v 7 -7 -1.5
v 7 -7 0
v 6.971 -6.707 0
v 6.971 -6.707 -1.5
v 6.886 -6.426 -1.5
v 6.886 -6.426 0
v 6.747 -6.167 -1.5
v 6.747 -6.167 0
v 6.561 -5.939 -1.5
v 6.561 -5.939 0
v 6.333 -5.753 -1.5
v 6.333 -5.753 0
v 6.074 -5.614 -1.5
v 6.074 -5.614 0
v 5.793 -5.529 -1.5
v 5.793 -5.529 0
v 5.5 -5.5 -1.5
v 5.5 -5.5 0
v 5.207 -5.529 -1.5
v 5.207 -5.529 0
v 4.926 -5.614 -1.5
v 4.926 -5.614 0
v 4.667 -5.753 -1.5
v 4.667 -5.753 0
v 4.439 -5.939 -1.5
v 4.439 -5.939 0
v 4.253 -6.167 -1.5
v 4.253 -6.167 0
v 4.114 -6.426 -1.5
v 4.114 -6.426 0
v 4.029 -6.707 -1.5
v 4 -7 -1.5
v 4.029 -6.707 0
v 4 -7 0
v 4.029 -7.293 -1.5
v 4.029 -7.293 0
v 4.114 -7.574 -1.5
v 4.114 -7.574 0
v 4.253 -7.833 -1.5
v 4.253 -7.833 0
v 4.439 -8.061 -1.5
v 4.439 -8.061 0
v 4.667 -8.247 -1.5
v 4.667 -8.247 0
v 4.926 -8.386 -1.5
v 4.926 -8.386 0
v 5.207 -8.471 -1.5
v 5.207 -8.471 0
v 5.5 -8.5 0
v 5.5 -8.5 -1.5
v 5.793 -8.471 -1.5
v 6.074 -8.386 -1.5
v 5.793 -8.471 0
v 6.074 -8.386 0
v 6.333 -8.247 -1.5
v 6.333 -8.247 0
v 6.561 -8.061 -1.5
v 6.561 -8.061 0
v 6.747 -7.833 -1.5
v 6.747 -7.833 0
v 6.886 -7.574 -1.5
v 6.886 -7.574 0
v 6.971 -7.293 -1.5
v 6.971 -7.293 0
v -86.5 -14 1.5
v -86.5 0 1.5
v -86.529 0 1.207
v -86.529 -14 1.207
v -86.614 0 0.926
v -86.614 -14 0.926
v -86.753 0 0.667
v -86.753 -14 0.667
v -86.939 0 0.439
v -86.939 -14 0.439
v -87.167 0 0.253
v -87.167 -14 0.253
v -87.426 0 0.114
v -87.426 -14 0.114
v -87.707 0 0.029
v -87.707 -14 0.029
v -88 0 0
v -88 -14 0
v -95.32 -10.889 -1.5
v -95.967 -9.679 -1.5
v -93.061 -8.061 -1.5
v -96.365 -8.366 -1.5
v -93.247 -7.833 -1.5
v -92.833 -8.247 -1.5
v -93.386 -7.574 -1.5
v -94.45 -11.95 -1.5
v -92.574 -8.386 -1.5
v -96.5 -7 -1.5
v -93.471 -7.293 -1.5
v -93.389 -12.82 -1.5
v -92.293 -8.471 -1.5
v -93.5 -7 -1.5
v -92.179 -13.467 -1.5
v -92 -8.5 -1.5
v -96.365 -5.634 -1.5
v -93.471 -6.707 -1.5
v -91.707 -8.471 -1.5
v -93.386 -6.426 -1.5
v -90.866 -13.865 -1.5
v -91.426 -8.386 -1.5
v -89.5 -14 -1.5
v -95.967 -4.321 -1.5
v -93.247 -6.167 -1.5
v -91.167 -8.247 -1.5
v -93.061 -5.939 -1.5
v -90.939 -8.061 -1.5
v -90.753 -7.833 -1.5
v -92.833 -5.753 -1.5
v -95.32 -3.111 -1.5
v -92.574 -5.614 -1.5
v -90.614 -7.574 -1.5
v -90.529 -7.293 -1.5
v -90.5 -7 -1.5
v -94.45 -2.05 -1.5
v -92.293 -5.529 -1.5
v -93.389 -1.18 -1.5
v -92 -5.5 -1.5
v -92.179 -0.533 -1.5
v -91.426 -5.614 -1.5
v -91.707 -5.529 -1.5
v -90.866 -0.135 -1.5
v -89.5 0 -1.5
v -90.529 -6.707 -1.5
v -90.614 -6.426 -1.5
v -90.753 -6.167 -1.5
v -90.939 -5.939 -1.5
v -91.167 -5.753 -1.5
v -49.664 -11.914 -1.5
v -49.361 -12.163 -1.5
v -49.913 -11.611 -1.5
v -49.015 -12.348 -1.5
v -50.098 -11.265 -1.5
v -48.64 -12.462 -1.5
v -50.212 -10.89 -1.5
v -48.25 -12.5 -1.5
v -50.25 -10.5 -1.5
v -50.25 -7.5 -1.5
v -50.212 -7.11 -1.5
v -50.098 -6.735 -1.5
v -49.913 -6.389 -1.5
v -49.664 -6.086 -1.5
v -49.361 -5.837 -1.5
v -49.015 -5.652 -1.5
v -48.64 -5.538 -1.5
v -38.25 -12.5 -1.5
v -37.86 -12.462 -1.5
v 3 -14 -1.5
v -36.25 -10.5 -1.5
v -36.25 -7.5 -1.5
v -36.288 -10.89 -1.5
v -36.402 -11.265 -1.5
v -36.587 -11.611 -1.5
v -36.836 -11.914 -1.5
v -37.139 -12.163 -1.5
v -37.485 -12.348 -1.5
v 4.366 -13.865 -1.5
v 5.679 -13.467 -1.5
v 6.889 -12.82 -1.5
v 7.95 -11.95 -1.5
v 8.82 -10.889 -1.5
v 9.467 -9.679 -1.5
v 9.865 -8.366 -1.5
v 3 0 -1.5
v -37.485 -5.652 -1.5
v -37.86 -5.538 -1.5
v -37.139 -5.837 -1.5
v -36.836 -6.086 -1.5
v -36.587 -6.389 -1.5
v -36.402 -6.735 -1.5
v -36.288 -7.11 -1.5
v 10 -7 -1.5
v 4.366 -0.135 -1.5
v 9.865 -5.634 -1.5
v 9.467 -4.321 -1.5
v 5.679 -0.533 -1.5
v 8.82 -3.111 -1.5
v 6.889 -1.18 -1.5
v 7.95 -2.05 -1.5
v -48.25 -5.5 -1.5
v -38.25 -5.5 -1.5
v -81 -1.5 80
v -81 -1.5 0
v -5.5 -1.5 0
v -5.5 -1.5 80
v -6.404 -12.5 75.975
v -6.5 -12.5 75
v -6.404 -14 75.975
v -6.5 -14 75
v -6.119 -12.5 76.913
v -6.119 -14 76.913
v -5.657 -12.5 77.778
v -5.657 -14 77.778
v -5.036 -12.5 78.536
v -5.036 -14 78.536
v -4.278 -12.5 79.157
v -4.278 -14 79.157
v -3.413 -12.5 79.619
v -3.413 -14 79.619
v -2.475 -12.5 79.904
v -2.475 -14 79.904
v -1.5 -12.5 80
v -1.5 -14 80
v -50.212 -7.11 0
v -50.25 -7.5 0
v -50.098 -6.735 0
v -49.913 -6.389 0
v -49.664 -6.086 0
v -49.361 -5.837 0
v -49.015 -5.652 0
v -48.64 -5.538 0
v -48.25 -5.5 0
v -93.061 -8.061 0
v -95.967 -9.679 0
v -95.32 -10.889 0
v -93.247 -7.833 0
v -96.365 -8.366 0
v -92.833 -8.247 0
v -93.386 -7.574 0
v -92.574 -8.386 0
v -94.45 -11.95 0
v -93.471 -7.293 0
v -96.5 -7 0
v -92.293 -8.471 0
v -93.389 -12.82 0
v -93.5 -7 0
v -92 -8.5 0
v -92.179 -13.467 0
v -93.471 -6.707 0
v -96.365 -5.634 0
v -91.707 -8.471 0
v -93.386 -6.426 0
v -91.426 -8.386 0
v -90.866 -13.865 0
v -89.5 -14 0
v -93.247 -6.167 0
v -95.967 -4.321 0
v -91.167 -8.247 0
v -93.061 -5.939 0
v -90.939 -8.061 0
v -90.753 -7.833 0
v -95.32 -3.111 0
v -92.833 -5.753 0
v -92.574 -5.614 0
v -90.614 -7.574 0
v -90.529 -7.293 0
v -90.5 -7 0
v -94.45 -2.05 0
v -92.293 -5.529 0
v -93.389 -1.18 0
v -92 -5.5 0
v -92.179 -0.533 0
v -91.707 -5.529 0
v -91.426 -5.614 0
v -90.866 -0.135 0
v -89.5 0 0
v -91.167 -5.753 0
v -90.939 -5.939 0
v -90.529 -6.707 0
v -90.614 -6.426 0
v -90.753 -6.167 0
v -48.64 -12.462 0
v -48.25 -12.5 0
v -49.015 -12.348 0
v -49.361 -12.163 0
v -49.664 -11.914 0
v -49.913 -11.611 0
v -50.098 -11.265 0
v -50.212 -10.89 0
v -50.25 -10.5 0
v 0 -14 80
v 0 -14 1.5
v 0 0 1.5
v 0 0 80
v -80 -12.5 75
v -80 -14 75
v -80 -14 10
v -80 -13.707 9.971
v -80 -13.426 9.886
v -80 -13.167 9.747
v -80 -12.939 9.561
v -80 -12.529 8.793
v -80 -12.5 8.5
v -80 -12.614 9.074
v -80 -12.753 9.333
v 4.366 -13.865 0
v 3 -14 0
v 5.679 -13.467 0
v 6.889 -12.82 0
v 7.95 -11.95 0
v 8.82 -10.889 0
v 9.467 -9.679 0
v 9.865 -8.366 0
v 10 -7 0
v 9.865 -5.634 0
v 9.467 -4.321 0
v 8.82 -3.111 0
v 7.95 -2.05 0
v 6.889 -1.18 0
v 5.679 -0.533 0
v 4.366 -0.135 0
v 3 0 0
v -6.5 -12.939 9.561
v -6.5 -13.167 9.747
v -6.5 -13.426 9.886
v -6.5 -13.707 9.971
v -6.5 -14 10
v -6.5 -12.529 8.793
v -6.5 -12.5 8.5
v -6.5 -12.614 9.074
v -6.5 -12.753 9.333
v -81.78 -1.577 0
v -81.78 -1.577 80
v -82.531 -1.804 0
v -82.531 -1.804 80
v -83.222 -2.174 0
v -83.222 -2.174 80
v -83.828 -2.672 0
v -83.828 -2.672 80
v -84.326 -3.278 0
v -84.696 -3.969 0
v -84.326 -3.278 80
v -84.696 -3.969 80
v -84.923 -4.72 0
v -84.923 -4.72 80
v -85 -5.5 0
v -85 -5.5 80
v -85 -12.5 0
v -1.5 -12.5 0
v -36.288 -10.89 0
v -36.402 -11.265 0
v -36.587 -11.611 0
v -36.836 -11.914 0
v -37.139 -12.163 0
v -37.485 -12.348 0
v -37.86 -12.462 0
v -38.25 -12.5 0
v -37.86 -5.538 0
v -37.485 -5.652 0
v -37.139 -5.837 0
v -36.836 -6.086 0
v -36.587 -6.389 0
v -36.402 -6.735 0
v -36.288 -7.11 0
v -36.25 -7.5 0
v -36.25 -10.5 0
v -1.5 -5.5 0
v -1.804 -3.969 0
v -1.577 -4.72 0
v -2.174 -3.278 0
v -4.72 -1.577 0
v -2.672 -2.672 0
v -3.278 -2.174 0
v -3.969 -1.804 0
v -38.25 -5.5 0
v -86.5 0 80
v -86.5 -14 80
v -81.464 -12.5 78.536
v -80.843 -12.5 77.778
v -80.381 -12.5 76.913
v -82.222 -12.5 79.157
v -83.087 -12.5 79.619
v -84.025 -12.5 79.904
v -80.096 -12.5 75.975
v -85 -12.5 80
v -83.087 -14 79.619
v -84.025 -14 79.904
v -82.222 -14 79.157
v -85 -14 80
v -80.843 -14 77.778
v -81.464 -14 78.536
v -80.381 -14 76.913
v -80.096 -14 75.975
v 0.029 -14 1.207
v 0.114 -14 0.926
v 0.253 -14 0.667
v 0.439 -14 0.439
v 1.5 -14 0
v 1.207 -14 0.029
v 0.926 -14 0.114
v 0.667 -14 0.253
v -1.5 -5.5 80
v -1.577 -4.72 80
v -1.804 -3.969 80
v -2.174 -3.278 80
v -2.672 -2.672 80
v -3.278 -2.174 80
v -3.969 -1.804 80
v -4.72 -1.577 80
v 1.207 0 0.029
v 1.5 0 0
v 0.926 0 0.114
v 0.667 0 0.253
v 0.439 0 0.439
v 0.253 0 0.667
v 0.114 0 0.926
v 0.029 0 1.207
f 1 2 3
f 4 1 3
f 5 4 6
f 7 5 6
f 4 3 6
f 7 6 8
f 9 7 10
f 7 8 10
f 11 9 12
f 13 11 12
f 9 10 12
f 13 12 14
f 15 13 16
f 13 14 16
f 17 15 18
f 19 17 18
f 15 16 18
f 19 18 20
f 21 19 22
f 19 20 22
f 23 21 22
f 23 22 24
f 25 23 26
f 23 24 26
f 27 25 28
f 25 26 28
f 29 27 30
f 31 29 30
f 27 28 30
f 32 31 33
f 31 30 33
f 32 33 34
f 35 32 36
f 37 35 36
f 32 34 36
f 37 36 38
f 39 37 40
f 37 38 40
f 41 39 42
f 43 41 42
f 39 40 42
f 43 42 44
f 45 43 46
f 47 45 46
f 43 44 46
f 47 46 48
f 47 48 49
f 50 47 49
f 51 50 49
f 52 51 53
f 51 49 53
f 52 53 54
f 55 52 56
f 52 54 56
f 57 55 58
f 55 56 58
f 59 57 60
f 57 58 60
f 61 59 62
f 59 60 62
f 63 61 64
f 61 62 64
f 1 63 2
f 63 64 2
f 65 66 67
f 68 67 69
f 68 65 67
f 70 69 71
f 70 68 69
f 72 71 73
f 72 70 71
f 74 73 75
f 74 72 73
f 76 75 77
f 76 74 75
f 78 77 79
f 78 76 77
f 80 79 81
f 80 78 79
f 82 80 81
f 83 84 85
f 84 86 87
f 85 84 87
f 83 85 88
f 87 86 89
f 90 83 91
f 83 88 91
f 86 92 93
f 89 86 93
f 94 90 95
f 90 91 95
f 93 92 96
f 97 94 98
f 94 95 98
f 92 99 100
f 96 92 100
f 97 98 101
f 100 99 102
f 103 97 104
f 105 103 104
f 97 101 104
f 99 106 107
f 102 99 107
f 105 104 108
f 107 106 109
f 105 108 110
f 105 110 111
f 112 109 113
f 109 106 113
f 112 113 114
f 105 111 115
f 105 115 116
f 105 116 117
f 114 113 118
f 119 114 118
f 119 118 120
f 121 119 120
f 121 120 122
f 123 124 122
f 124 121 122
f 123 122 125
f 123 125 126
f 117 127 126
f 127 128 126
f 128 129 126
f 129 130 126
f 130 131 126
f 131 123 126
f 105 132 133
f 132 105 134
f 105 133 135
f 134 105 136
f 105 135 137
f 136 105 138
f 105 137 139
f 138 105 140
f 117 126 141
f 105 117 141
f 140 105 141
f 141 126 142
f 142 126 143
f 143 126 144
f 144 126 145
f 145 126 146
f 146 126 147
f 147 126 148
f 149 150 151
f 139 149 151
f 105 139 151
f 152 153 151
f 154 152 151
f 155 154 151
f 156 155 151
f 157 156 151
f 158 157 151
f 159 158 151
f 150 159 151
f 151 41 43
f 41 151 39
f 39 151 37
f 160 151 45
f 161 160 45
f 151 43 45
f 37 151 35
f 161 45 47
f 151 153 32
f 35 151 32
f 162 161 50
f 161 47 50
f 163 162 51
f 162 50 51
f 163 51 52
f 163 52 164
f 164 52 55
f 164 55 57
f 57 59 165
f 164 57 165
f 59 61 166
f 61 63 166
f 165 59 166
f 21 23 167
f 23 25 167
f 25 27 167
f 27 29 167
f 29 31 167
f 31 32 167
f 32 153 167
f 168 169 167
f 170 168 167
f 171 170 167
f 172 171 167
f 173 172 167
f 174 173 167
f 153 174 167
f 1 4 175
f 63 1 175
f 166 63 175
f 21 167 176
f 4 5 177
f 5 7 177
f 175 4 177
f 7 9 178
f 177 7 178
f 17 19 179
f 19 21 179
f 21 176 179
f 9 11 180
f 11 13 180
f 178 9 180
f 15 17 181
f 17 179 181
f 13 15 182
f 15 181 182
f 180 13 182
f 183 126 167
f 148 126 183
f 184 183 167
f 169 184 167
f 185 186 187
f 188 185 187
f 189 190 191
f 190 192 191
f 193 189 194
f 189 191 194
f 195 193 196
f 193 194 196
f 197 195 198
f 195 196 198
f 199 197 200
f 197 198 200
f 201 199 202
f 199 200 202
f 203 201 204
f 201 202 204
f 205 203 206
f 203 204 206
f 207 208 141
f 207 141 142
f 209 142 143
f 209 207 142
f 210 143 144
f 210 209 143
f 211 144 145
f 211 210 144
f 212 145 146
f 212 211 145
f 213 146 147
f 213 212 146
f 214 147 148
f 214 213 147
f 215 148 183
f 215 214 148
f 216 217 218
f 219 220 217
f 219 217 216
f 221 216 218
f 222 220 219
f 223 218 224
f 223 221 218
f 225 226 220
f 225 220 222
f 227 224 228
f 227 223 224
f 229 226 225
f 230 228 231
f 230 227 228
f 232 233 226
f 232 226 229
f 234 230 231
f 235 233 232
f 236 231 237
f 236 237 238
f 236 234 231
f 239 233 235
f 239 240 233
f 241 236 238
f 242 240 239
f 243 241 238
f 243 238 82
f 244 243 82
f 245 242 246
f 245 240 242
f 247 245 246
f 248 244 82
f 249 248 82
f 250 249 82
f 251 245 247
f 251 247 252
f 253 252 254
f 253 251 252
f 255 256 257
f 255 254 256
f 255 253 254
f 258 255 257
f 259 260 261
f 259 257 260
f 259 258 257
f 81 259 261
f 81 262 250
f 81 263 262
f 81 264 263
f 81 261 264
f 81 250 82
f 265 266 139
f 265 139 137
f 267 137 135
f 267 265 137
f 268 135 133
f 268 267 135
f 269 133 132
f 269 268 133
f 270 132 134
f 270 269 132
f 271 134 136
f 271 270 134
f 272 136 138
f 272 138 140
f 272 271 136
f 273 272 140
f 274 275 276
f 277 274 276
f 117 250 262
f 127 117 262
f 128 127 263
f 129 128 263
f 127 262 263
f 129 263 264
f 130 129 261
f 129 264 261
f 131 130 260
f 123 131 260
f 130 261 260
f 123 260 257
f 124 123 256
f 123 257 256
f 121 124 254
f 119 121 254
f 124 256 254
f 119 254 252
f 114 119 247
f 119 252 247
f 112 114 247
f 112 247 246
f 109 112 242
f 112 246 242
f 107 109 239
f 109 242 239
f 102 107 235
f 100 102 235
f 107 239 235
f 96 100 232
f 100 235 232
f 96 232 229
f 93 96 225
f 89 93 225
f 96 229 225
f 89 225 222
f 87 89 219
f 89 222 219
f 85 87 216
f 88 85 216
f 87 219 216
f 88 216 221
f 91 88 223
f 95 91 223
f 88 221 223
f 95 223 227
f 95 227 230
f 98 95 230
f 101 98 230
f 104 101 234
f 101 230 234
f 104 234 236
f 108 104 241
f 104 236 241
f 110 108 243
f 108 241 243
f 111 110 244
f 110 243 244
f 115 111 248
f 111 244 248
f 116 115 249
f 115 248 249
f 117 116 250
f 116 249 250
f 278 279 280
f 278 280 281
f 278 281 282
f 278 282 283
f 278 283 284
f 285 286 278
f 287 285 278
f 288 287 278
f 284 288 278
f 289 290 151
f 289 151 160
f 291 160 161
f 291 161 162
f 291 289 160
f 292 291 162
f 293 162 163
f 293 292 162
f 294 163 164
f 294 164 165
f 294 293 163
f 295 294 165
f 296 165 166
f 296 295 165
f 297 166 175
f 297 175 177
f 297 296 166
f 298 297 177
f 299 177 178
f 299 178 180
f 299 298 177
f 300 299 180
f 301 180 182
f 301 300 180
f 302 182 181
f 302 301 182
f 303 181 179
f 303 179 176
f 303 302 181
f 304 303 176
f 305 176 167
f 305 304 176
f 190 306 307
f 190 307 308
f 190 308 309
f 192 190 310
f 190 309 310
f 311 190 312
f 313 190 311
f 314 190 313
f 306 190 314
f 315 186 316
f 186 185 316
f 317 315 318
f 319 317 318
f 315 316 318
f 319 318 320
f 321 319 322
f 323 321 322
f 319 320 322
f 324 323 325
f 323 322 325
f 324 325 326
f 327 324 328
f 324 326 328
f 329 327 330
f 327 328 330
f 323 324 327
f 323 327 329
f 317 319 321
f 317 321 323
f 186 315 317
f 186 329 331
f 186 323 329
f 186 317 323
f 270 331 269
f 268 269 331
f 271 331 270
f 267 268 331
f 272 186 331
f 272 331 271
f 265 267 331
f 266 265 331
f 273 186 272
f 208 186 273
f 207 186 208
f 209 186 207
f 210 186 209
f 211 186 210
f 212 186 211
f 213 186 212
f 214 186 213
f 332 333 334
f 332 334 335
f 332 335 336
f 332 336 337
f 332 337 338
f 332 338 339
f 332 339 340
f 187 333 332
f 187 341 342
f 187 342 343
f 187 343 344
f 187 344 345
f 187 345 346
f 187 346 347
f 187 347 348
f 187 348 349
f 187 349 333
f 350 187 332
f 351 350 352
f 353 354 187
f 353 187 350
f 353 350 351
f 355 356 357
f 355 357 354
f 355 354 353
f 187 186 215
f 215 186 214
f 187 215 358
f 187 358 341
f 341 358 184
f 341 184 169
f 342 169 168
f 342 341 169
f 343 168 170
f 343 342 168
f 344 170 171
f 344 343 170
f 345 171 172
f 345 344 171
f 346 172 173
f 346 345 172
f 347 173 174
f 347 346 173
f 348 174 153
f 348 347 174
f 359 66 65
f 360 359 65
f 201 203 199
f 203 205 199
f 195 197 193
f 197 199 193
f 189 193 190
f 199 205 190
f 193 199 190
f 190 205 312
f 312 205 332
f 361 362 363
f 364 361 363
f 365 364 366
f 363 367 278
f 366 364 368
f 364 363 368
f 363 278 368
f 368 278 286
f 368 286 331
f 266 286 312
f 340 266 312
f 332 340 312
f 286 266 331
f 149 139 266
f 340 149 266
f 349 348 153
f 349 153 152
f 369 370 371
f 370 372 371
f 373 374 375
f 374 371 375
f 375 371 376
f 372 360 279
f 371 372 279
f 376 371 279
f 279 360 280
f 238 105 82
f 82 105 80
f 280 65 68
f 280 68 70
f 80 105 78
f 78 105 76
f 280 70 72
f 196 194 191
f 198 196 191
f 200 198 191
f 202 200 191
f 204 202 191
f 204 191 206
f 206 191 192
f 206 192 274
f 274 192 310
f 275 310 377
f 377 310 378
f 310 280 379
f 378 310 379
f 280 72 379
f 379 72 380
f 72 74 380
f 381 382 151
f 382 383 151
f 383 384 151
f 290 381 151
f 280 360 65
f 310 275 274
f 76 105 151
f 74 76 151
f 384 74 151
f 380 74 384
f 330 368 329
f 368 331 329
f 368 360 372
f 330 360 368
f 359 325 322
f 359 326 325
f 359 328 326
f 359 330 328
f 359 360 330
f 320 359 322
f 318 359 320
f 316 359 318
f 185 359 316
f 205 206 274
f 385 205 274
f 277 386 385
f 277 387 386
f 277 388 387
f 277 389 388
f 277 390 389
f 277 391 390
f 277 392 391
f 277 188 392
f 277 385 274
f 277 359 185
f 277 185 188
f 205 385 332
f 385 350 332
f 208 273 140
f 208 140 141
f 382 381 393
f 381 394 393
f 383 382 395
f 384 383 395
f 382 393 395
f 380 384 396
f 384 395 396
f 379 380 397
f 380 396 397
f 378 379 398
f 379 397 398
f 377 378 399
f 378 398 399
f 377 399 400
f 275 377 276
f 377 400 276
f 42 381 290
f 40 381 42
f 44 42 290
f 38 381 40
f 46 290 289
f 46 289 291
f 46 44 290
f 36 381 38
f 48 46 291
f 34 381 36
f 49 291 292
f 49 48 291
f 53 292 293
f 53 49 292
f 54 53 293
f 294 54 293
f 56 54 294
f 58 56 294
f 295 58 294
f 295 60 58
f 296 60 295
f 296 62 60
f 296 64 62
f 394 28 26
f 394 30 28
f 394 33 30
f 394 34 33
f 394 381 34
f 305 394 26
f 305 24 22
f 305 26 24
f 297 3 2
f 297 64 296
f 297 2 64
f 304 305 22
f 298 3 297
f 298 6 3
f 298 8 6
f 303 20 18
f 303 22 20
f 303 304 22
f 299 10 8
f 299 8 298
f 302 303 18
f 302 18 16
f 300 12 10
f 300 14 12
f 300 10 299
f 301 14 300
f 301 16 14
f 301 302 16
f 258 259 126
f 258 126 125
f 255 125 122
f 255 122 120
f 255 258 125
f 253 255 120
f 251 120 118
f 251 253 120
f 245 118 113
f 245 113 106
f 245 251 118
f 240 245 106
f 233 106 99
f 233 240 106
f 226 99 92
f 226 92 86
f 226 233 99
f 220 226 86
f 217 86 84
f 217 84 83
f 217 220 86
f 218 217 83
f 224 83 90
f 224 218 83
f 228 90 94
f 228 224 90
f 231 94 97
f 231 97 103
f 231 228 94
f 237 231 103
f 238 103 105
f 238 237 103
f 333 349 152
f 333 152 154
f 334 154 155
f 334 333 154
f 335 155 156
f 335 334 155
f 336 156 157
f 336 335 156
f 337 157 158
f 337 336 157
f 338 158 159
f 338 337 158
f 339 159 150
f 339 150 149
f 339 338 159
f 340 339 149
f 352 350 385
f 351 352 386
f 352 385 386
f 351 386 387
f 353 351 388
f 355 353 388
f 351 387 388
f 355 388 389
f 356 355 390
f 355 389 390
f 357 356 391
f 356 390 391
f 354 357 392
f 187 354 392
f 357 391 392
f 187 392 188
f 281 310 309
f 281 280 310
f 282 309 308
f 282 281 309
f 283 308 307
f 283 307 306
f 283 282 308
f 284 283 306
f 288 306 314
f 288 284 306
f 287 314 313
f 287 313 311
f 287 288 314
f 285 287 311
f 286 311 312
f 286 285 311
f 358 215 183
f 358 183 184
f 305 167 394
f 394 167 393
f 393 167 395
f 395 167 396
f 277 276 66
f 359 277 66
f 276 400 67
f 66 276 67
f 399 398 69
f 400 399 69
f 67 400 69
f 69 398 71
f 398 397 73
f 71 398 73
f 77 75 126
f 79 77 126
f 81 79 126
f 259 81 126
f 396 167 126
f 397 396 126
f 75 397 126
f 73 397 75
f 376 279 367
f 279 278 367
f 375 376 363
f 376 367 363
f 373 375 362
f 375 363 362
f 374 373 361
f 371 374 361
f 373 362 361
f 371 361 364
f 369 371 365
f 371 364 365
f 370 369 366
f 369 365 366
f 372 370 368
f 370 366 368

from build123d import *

# Parameters (mm, degrees)
F1_R     = 1.5
F2_DEPTH = 1.5
F3_DEPTH = 10
F4_DEPTH = 80
F5_R     = 5
F6_R     = 1.49999
F7_R     = 4


# Not quite as in the source:
# - a fillet or chamfer is up to 0.001 mm smaller than in the source, because OpenCascade refuses the exact size
# - a feature names something its author has since deleted; it is built from what else it names


with BuildPart() as f2:
    # F1 (on Top) → F2 (new body)
    with BuildSketch(Plane.XY):
        Polygon((-85, -12.5), (-85, -1.5), (-1.5, -1.5), (-1.5, -12.5), (0, -12.5), (0, 0), (-86.5, 0), (-86.5, -12.5), align=None)
        Polygon((-48.25, -12.5), (-80, -12.5), (-80, -14), (-6.5, -14), (-6.5, -12.5), (-38.25, -12.5), align=None)
        with BuildLine():
            Line((-1.5, -1.5), (-85, -1.5))
            Line((-85, -1.5), (-85, -12.5))
            Line((-85, -12.5), (-80, -12.5))
            Line((-80, -12.5), (-48.25, -12.5))
            ThreePointArc((-48.25, -12.5), (-49.6642135624, -11.9142135624), (-50.25, -10.5))
            Line((-50.25, -10.5), (-50.25, -7.5))
            ThreePointArc((-50.25, -7.5), (-49.6642135624, -6.0857864376), (-48.25, -5.5))
            Line((-48.25, -5.5), (-38.25, -5.5))
            ThreePointArc((-38.25, -5.5), (-36.8357864376, -6.0857864376), (-36.25, -7.5))
            Line((-36.25, -7.5), (-36.25, -10.5))
            ThreePointArc((-36.25, -10.5), (-36.8357864376, -11.9142135624), (-38.25, -12.5))
            Line((-38.25, -12.5), (-6.5, -12.5))
            Line((-6.5, -12.5), (-1.5, -12.5))
            Line((-1.5, -12.5), (-1.5, -1.5))
        make_face()
        with BuildLine():
            Line((-86.5, -14), (-86.5, -12.5))
            Line((-86.5, -12.5), (-86.5, 0))
            Line((-86.5, 0), (-89.5, 0))
            ThreePointArc((-89.5, 0), (-96.5, -7), (-89.5, -14))
            Line((-89.5, -14), (-86.5, -14))
        make_face()
        with Locations((-92, -7)):
            Circle(F1_R, mode=Mode.SUBTRACT)
        with BuildLine():
            Line((0, 0), (0, -12.5))
            Line((0, -12.5), (0, -14))
            Line((0, -14), (3, -14))
            ThreePointArc((3, -14), (10, -7), (3, 0))
            Line((3, 0), (0, 0))
        make_face()
        with Locations((5.5, -7)):
            Circle(F1_R, mode=Mode.SUBTRACT)
        Polygon((-80, -12.5), (-85, -12.5), (-86.5, -12.5), (-86.5, -14), (-80, -14), align=None)
        Polygon((0, -12.5), (-1.5, -12.5), (-6.5, -12.5), (-6.5, -14), (0, -14), align=None)
    extrude(amount=-F2_DEPTH)

    # F1 (on Top) → F3 (join)
    with BuildSketch(Plane.XY):
        Polygon((0, -12.5), (-1.5, -12.5), (-6.5, -12.5), (-6.5, -14), (0, -14), align=None)
        Polygon((-80, -12.5), (-85, -12.5), (-86.5, -12.5), (-86.5, -14), (-80, -14), align=None)
        Polygon((-48.25, -12.5), (-80, -12.5), (-80, -14), (-6.5, -14), (-6.5, -12.5), (-38.25, -12.5), align=None)
    extrude(amount=F3_DEPTH)

    # F1 (on Top) → F4 (join)
    with BuildSketch(Plane.XY):
        Polygon((-85, -12.5), (-85, -1.5), (-1.5, -1.5), (-1.5, -12.5), (0, -12.5), (0, 0), (-86.5, 0), (-86.5, -12.5), align=None)
        Polygon((-80, -12.5), (-85, -12.5), (-86.5, -12.5), (-86.5, -14), (-80, -14), align=None)
        Polygon((0, -12.5), (-1.5, -12.5), (-6.5, -12.5), (-6.5, -14), (0, -14), align=None)
    extrude(amount=F4_DEPTH)

    # F5
    f5_edges = [f2.edges().sort_by_distance(p)[0] for p in [
        (-80, -13.25, 80),
        (-6.5, -13.25, 80),
    ]]
    fillet(f5_edges, radius=F5_R)

    # F6 (radius 1.5 in the source; OpenCascade refuses exactly that, so slightly less here)
    f6_edges = [f2.edges().sort_by_distance(p)[0] for p in [
        (-43.25, -12.5, 10),
        (-86.5, -7, 0),
        (0, -7, 0),
    ]]
    fillet(f6_edges, radius=F6_R)

    # F7
    f7_edges = [f2.edges().sort_by_distance(p)[0] for p in [
        (-85, -1.5, 40),
        (-1.5, -1.5, 40),
    ]]
    fillet(f7_edges, radius=F7_R)


solid = f2.part
